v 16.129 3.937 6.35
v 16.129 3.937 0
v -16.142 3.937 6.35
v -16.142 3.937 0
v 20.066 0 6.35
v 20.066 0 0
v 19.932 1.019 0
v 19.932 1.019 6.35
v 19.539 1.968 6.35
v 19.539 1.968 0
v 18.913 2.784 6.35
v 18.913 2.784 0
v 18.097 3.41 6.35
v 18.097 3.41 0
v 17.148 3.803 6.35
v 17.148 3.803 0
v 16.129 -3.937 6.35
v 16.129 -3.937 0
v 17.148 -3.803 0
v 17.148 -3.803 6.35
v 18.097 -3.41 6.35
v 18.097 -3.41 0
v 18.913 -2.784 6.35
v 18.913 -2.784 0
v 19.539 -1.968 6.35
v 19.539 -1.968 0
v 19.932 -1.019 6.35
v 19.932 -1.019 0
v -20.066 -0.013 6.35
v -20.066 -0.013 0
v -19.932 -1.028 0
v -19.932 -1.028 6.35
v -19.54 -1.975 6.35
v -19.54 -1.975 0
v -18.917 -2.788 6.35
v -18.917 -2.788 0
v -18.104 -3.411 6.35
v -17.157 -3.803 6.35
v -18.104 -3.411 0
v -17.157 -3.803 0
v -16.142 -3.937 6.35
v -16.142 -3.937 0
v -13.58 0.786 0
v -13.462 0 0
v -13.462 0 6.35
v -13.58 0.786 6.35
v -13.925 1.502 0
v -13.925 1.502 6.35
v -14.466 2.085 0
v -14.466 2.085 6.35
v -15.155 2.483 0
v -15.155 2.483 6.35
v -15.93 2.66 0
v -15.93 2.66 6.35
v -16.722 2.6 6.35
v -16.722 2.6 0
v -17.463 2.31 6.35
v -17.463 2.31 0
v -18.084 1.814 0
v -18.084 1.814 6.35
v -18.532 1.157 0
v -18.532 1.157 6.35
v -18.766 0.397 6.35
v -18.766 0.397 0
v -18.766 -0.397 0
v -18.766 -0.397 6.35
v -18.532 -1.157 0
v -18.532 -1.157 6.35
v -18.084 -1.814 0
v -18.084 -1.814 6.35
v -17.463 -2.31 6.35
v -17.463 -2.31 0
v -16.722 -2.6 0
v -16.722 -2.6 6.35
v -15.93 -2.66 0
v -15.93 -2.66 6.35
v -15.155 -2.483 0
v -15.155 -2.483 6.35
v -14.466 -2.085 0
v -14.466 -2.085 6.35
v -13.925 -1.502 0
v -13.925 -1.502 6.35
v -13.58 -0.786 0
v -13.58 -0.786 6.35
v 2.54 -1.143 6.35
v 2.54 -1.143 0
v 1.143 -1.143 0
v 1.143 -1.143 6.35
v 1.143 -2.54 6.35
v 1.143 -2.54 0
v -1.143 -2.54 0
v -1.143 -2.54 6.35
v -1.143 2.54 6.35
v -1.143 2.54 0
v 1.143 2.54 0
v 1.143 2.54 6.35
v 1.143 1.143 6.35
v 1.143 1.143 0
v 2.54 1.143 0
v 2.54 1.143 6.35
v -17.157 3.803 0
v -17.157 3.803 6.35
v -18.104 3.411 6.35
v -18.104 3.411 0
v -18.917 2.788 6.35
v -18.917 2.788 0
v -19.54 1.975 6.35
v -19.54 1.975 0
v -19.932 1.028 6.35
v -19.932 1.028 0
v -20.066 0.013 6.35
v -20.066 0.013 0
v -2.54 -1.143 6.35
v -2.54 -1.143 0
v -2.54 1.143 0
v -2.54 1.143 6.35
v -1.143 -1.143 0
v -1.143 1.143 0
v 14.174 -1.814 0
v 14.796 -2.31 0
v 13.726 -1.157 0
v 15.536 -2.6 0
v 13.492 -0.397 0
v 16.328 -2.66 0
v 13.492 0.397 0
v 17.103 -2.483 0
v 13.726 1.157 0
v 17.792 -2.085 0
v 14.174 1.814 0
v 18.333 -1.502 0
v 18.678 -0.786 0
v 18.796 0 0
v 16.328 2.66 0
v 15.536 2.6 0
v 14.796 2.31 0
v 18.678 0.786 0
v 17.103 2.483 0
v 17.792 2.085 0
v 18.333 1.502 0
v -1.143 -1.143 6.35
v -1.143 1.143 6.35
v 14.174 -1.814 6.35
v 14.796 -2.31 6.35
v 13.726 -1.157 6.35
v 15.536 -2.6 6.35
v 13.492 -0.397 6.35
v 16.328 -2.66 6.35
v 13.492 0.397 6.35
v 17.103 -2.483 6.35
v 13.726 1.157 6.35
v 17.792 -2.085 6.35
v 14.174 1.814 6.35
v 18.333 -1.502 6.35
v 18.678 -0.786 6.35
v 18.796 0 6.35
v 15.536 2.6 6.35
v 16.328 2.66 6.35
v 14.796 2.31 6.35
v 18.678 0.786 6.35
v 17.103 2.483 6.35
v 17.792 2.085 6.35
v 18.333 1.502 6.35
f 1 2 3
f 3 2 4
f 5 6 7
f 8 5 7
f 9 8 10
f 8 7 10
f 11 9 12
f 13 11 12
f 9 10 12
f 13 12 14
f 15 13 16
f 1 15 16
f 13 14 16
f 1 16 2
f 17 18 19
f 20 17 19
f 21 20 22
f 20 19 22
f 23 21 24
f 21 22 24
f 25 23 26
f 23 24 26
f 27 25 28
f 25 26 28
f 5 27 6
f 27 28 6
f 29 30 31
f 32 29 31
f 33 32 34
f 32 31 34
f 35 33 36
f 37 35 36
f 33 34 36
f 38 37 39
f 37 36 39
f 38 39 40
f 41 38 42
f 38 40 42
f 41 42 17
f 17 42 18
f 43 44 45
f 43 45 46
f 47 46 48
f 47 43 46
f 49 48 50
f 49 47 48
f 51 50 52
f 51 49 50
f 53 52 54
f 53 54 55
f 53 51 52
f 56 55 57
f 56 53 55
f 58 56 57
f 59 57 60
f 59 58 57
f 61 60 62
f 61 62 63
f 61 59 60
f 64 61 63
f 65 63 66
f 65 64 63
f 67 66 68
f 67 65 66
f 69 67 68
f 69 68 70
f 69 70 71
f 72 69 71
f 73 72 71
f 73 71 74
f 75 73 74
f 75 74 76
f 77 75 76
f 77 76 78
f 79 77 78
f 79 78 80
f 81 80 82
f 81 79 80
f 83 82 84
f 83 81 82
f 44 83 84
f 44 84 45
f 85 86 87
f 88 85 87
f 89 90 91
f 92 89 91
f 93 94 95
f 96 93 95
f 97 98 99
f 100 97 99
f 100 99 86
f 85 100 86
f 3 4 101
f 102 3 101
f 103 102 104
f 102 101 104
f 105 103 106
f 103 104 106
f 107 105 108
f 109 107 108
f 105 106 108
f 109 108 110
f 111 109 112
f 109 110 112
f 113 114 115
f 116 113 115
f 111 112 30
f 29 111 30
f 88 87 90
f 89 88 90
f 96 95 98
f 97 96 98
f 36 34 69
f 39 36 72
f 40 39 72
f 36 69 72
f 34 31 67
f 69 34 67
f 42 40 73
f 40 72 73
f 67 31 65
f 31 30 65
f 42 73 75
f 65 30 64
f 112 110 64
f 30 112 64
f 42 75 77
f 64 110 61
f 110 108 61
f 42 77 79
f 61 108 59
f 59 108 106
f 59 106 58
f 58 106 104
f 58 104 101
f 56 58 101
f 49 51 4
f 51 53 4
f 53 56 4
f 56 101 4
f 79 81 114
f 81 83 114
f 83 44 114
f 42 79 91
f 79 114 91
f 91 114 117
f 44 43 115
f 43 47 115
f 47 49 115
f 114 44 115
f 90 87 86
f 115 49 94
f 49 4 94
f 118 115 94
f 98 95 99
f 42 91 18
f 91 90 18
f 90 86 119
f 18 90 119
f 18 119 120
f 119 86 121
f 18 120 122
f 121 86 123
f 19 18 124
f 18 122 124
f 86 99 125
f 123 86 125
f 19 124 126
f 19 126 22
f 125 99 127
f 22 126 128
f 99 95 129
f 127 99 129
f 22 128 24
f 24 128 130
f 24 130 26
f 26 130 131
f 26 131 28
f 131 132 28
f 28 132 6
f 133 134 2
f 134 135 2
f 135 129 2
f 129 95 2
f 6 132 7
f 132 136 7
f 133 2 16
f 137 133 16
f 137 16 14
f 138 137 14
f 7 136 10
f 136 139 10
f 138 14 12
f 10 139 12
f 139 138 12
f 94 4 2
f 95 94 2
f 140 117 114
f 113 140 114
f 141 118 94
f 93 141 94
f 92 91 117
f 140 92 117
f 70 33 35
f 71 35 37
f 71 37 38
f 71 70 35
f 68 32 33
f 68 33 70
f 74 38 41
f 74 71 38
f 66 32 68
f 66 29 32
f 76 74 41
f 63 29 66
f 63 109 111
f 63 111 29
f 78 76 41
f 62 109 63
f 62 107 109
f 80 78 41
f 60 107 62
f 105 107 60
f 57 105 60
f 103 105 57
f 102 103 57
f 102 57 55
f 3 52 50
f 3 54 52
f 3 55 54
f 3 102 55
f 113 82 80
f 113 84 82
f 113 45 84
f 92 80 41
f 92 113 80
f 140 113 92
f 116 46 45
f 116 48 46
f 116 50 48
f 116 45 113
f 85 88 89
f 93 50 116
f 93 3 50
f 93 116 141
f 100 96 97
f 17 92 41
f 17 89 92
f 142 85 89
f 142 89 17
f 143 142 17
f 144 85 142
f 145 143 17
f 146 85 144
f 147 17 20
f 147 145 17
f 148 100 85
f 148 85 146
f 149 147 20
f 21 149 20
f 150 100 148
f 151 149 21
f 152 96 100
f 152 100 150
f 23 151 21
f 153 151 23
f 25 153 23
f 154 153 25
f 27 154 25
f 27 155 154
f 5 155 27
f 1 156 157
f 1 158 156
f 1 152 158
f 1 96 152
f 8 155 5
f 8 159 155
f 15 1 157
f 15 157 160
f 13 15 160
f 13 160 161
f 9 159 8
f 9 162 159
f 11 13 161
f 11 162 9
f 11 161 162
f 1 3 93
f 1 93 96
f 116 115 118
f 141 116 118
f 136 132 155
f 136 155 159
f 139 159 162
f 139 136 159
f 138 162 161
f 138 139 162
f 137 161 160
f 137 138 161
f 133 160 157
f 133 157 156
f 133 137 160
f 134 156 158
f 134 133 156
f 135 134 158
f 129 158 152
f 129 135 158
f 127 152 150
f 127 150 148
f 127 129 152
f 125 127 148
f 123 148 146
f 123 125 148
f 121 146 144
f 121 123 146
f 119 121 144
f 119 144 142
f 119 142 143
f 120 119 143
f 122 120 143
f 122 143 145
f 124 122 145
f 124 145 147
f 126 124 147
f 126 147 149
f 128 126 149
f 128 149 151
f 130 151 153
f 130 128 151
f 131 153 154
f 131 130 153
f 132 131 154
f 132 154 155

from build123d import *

# Parameters (mm, degrees)
F0_R     = 2.667
F1_DEPTH = 6.35


with BuildPart() as f1:
    # F0 (on Top) → F1 (new body)
    with BuildSketch(Plane.XY):
        with BuildLine():
            Line((-16.1417, -3.937), (16.129, -3.937))
            ThreePointArc((16.129, -3.937), (18.912879, -2.783879), (20.066, 0))
            ThreePointArc((20.066, 0), (18.912879, 2.783879), (16.129, 3.937))
            Line((16.129, 3.937), (-16.1417, 3.937))
            ThreePointArc((-16.1417, 3.937), (-18.916599, 2.787599), (-20.066, 0.0127))
            Line((-20.066, 0.0127), (-20.066, -0.0127))
            ThreePointArc((-20.066, -0.0127), (-18.916599, -2.787599), (-16.1417, -3.937))
        make_face()
        with Locations((-16.129, 0)):
            Circle(F0_R, mode=Mode.SUBTRACT)
        Polygon((-1.143, 2.54), (0, 2.54), (1.143, 2.54), (1.143, 1.143), (2.54, 1.143), (2.54, 0), (2.54, -1.143), (1.143, -1.143), (1.143, -2.54), (0, -2.54), (-1.143, -2.54), (-1.143, -1.143), (-2.54, -1.143), (-2.54, 0), (-2.54, 1.143), (-1.143, 1.143), align=None, mode=Mode.SUBTRACT)
        with Locations((16.129, 0)):
            Circle(F0_R, mode=Mode.SUBTRACT)
    extrude(amount=F1_DEPTH)


solid = f1.part
